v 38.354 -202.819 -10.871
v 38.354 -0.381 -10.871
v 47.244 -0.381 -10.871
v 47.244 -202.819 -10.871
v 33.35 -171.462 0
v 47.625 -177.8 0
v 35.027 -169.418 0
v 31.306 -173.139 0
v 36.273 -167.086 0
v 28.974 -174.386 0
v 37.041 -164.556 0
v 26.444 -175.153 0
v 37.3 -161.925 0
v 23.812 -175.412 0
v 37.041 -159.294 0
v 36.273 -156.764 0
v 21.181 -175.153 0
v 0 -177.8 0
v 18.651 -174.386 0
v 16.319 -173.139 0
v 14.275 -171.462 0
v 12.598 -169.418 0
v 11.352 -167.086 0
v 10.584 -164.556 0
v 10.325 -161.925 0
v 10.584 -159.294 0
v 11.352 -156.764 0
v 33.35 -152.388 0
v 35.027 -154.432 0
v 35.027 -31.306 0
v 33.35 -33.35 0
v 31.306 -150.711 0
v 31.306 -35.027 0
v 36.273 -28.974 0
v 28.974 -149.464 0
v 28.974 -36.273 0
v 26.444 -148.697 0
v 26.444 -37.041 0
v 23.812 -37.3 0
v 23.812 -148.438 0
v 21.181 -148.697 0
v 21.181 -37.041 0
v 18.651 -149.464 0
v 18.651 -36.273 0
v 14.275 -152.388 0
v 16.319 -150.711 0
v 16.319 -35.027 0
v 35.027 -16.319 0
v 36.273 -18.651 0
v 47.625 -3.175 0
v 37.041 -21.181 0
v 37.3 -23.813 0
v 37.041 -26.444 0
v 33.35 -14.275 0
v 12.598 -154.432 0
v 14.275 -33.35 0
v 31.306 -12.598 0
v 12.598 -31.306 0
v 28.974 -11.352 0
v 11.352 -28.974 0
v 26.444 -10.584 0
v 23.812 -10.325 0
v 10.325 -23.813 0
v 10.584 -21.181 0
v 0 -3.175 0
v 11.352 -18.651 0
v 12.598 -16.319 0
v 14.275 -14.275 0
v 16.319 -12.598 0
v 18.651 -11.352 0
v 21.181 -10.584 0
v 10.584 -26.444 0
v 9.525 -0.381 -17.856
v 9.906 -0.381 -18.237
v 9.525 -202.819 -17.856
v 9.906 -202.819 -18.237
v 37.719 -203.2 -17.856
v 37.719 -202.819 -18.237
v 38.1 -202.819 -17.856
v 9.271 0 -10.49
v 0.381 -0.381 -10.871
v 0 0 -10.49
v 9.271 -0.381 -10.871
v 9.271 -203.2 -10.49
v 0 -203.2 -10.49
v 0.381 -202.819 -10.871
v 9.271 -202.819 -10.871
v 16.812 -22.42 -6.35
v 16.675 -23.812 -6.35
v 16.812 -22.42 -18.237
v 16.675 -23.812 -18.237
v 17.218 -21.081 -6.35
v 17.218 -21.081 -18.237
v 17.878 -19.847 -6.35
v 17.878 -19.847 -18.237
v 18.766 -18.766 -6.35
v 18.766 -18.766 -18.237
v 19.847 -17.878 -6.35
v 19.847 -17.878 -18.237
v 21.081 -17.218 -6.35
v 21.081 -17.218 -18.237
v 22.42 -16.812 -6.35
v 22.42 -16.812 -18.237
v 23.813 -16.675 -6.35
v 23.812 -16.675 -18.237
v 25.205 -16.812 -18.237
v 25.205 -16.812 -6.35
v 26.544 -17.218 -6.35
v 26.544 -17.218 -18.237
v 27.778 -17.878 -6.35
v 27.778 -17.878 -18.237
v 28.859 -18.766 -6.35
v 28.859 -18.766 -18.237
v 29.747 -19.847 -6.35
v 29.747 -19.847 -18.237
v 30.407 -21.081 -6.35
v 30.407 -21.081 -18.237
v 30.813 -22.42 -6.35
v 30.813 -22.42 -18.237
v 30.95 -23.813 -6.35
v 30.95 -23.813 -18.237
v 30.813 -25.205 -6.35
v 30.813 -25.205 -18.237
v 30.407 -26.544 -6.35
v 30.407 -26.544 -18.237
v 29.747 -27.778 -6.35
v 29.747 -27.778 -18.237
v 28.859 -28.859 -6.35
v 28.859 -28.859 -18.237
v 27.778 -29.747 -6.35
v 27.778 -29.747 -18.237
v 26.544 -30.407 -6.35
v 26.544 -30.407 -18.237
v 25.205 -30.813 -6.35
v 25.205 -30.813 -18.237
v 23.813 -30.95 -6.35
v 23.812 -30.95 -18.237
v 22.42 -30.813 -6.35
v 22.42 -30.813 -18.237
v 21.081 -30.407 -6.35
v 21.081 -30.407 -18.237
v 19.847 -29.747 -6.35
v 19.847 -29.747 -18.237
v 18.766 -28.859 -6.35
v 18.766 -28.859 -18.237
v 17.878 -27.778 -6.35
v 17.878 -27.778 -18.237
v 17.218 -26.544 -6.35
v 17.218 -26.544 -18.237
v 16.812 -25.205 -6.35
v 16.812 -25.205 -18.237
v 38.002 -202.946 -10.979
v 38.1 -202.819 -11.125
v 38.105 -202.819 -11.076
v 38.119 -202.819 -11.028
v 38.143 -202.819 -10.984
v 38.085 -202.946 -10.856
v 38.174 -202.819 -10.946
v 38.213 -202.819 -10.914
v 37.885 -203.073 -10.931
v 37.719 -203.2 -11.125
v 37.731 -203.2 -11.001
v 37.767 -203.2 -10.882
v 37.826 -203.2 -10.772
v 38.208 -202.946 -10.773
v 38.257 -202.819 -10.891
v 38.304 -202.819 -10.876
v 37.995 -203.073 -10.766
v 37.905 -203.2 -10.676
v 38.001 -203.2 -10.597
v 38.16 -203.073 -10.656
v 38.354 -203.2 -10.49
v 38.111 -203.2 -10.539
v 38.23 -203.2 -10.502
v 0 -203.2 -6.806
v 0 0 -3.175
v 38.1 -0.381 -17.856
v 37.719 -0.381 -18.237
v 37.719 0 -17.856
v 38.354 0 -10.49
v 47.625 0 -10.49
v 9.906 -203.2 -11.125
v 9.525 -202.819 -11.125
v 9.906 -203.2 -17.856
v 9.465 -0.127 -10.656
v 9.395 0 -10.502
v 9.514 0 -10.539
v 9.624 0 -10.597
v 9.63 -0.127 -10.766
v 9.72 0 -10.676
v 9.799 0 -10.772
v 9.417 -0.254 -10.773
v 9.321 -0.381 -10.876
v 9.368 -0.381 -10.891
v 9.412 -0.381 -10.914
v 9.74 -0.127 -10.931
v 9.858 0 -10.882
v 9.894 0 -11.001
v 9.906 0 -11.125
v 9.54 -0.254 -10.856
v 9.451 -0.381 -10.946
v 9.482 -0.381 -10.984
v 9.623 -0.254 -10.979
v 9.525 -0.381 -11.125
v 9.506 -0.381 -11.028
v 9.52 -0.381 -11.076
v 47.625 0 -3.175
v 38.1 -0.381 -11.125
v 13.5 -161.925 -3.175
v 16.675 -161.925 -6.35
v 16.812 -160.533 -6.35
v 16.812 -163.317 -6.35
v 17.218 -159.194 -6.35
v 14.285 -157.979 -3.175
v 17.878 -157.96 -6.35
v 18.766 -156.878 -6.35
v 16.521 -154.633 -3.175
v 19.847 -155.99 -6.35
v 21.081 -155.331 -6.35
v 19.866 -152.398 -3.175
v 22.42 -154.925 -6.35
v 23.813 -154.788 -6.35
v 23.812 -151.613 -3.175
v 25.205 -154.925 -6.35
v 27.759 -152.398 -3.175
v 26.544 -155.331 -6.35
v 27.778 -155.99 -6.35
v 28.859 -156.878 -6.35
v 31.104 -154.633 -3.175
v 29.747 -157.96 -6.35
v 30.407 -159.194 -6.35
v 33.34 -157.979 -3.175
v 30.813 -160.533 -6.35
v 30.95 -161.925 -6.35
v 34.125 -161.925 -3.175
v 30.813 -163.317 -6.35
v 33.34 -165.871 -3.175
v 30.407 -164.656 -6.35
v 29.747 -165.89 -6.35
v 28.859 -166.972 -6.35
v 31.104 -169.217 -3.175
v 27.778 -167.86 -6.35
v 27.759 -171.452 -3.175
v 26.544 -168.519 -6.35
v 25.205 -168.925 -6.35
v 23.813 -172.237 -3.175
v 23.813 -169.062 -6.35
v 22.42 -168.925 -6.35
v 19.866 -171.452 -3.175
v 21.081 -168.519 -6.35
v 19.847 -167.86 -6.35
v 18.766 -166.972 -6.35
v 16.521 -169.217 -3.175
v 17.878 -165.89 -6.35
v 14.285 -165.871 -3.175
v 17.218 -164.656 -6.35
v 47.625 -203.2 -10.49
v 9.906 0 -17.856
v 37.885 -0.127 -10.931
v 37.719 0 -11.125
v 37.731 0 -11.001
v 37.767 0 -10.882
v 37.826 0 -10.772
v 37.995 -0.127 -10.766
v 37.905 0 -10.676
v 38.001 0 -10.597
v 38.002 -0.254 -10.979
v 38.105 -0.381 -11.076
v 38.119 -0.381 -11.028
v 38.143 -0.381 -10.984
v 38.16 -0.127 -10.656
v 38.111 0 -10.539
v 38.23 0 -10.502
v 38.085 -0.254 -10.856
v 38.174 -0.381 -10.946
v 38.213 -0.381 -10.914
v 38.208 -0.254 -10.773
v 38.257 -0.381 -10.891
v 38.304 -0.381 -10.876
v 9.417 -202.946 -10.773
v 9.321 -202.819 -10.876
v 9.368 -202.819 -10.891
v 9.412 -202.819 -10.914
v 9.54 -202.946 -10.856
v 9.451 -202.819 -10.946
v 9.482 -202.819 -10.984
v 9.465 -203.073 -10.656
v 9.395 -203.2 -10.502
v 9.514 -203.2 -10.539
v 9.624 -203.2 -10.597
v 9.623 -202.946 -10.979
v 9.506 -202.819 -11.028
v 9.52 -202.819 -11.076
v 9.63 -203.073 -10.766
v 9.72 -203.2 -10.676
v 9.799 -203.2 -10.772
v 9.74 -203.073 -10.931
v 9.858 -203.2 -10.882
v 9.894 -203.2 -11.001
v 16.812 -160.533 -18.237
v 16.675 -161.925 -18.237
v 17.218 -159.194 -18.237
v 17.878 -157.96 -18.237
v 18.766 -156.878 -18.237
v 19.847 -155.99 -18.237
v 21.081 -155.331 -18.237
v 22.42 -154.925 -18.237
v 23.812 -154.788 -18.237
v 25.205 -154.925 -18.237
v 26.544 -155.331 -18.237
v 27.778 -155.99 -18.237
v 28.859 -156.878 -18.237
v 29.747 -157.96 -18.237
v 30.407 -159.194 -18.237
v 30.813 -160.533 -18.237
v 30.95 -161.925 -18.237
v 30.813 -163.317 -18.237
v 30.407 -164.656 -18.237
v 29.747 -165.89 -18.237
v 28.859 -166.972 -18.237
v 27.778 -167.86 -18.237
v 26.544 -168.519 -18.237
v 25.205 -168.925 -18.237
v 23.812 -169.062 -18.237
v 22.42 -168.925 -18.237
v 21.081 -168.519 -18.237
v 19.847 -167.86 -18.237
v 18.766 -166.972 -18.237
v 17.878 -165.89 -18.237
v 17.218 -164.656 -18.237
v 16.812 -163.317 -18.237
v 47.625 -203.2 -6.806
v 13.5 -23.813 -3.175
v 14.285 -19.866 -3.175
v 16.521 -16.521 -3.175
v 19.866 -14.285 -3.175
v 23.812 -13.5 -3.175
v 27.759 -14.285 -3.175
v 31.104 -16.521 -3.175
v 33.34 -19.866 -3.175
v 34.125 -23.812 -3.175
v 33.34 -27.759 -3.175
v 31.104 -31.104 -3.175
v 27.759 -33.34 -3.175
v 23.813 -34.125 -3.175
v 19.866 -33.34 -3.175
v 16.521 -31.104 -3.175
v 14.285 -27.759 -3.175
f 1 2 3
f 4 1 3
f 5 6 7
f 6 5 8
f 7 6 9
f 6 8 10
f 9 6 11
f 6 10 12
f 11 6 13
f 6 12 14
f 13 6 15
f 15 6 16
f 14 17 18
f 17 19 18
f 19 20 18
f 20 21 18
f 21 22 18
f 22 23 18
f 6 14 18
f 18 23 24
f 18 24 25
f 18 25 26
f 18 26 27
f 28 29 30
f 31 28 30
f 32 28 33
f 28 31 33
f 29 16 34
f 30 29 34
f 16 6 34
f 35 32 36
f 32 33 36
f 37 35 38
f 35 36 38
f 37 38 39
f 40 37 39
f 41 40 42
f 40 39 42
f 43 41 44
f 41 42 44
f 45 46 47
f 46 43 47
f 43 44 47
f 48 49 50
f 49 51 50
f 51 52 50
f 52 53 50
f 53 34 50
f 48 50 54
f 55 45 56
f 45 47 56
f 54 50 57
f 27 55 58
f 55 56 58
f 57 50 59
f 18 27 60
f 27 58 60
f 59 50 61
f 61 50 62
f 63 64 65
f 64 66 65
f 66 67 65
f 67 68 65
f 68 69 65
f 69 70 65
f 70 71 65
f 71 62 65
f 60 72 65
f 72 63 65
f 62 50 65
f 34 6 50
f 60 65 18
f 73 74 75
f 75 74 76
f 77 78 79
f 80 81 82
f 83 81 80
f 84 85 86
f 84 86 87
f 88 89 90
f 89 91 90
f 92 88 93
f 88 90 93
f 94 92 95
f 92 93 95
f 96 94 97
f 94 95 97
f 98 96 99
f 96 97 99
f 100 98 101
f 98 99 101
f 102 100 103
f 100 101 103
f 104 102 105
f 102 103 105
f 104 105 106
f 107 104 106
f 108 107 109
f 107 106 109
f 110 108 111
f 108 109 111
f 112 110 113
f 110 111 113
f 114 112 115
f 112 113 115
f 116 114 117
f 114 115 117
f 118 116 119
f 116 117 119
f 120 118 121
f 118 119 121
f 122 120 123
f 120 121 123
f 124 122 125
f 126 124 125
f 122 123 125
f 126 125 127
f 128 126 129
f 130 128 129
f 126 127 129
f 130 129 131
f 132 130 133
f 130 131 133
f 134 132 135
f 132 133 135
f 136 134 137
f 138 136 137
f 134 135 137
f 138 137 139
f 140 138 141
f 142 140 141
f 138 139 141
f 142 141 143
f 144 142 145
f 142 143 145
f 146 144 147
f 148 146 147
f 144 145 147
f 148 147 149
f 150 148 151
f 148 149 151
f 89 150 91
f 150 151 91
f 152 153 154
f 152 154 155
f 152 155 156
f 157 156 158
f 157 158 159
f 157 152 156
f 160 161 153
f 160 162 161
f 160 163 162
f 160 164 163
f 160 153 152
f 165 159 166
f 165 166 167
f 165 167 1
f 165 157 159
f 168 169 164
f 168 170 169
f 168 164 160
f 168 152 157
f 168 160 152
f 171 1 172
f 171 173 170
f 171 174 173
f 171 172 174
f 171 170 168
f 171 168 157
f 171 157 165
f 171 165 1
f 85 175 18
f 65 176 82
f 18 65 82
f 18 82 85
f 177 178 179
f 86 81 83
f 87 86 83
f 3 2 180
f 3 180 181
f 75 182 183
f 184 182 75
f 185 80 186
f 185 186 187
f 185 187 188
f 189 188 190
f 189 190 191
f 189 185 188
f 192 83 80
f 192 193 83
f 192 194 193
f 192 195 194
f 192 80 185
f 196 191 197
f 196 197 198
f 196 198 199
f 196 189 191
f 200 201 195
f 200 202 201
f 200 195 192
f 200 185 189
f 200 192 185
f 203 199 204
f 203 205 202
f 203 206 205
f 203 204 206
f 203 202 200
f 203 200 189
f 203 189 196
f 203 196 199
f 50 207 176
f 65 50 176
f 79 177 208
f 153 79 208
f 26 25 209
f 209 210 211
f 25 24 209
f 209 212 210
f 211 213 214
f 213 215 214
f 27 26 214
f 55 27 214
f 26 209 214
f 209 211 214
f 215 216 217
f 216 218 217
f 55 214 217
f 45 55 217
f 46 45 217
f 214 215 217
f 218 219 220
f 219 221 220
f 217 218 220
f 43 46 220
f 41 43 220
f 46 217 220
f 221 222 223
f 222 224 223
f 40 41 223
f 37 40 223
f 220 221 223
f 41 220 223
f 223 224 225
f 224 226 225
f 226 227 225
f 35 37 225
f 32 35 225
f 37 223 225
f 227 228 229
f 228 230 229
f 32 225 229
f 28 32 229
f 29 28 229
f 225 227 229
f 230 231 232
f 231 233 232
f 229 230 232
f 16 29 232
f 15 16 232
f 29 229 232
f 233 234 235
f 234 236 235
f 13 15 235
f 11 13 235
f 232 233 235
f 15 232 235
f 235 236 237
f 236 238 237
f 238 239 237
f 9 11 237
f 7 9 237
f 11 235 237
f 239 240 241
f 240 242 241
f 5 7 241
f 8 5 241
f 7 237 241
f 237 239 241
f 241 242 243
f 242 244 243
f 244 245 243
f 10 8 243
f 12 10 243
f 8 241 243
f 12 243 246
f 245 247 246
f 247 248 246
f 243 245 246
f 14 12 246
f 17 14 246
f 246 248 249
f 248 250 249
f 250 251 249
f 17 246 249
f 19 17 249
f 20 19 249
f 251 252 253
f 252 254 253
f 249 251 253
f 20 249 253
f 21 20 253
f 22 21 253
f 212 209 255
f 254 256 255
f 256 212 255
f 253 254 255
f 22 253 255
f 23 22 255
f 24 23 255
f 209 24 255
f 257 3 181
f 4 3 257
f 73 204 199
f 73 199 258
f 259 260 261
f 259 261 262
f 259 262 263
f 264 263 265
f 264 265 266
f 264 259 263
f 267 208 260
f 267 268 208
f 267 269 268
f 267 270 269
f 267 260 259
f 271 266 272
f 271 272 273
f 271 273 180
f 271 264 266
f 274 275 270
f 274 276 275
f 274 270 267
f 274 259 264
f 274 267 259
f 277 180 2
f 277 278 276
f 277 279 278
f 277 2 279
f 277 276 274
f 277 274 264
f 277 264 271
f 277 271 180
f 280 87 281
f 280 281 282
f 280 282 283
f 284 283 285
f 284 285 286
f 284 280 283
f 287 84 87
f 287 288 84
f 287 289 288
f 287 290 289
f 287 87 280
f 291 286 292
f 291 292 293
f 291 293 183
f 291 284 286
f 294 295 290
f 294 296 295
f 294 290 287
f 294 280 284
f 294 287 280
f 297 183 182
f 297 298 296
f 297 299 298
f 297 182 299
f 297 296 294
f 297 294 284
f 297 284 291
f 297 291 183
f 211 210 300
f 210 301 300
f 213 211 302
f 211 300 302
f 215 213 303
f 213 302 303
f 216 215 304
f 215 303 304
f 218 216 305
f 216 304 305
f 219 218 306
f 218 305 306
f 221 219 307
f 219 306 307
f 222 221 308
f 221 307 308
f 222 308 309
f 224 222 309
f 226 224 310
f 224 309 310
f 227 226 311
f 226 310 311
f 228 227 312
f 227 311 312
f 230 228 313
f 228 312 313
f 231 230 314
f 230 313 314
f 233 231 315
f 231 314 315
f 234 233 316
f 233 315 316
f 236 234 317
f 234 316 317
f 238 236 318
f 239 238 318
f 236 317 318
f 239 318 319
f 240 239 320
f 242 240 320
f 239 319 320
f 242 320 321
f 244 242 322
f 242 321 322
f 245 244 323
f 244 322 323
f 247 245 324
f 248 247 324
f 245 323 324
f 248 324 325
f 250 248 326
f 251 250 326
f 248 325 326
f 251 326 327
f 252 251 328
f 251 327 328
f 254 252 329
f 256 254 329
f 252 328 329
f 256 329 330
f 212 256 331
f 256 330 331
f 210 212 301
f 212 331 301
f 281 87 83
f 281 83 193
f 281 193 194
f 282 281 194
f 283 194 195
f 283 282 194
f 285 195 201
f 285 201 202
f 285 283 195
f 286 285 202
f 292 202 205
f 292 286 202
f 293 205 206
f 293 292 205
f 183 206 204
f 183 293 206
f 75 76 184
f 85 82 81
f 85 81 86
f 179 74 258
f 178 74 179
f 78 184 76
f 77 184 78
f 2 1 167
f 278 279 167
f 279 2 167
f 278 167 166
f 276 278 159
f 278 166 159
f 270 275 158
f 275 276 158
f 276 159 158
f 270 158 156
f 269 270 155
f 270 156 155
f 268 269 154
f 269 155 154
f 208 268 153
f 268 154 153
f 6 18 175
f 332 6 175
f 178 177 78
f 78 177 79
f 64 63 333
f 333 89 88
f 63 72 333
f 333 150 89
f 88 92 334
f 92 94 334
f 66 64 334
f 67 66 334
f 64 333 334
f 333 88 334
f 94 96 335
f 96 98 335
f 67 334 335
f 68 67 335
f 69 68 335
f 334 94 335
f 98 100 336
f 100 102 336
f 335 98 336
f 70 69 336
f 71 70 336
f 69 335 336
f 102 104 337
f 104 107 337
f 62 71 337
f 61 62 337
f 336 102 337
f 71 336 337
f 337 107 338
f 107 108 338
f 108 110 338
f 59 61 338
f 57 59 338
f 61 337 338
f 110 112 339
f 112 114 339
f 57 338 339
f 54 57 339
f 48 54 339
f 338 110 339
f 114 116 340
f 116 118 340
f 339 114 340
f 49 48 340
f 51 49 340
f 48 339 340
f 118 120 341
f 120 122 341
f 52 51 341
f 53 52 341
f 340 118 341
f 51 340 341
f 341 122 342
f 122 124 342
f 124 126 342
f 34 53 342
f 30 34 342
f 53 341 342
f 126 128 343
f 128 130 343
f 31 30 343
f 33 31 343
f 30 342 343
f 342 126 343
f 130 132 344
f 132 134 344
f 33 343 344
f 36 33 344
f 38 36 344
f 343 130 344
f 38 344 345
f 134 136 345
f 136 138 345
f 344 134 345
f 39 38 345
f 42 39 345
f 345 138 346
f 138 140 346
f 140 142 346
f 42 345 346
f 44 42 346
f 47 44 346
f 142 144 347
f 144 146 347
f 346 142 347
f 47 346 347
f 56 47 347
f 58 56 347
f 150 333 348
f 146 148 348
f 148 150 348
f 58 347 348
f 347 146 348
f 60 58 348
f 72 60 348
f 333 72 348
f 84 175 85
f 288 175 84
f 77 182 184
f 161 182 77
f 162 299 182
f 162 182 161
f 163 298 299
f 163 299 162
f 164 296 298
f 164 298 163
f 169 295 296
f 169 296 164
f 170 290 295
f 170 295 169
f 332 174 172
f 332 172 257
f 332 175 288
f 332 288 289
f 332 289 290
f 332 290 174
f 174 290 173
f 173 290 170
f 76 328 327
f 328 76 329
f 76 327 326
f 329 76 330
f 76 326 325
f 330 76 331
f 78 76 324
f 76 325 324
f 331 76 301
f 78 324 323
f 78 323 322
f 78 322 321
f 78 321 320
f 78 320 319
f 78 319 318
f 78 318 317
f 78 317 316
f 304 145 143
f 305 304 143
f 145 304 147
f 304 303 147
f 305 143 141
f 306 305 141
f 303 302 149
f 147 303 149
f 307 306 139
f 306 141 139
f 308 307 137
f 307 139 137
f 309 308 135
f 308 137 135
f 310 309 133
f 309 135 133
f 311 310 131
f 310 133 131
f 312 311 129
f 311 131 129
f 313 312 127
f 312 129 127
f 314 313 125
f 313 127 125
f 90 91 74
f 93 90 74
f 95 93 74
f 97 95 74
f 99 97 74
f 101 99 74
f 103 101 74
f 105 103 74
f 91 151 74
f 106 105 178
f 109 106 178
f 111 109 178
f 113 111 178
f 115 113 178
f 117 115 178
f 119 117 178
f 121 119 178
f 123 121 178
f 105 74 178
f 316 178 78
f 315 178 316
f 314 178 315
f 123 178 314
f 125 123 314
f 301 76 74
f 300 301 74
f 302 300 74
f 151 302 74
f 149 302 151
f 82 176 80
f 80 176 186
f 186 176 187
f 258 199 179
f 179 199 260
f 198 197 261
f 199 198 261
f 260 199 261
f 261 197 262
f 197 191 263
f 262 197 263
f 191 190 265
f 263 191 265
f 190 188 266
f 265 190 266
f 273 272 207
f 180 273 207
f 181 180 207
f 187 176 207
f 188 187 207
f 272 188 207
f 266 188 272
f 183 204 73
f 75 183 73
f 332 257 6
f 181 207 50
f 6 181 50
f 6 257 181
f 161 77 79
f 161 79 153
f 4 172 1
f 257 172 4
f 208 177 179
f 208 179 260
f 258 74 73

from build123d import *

# Parameters (mm, degrees)
F1_DEPTH       = 203.2
F3_DEPTH       = 47.626
F5_D           = 14.2748
F5_CSINK_D     = 26.9748
F5_CSINK_ANGLE = 90
F6_SIZE        = 3.175
F7_R           = 0.254
F8_SIZE        = 0.381


with BuildPart() as f1:
    # F0 (on Front) → F1 (new body)
    with BuildSketch(Plane.XZ):
        Polygon((47.625, 0), (0, 0), (0, -10.8712), (9.525, -10.8712), (9.525, -18.2372), (38.1, -18.2372), (38.1, -10.8712), (47.625, -10.8712), align=None)
    extrude(amount=F1_DEPTH)

    # F2 (on face) → F3 (cut, through all)
    with BuildSketch(Plane(origin=(0, 0, 0), x_dir=(0, -1, 0), z_dir=(-1, 0, 0))):
        Polygon((203.2, -6.805909), (203.2, 0), (177.8, 0), align=None)
    extrude(amount=-F3_DEPTH, mode=Mode.SUBTRACT)

    # F5 (through all)
    with Locations(Plane.XY):
        with Locations((23.8125, -23.8125), (23.8125, -161.925)):
            CounterSinkHole(F5_D / 2, F5_CSINK_D / 2, counter_sink_angle=F5_CSINK_ANGLE)

    # F6
    f6_edges = [f1.edges().sort_by_distance(p)[0] for p in [
        (23.8125, 0, 0),
    ]]
    chamfer(f6_edges, length=F6_SIZE)

    # F7
    f7_edges = [f1.edges().sort_by_distance(p)[0] for p in [
        (9.525, -101.6, -10.8712),
        (38.1, -101.6, -10.8712),
    ]]
    fillet(f7_edges, radius=F7_R)

    # F8
    f8_edges = [f1.edges().sort_by_distance(p)[0] for p in [
        (38.1, -101.6, -18.2372),
        (9.525, -101.6, -18.2372),
        (23.8125, -203.2, -18.2372),
        (23.8125, 0, -18.2372),
        (38.1, 0, -14.6812),
        (9.525, 0, -14.6812),
        (9.525, -203.2, -14.6812),
        (38.1, -203.2, -14.6812),
        (47.625, -101.6, -10.8712),
        (0, -101.6, -10.8712),
    ]]
    chamfer(f8_edges, length=F8_SIZE)


solid = f1.part
